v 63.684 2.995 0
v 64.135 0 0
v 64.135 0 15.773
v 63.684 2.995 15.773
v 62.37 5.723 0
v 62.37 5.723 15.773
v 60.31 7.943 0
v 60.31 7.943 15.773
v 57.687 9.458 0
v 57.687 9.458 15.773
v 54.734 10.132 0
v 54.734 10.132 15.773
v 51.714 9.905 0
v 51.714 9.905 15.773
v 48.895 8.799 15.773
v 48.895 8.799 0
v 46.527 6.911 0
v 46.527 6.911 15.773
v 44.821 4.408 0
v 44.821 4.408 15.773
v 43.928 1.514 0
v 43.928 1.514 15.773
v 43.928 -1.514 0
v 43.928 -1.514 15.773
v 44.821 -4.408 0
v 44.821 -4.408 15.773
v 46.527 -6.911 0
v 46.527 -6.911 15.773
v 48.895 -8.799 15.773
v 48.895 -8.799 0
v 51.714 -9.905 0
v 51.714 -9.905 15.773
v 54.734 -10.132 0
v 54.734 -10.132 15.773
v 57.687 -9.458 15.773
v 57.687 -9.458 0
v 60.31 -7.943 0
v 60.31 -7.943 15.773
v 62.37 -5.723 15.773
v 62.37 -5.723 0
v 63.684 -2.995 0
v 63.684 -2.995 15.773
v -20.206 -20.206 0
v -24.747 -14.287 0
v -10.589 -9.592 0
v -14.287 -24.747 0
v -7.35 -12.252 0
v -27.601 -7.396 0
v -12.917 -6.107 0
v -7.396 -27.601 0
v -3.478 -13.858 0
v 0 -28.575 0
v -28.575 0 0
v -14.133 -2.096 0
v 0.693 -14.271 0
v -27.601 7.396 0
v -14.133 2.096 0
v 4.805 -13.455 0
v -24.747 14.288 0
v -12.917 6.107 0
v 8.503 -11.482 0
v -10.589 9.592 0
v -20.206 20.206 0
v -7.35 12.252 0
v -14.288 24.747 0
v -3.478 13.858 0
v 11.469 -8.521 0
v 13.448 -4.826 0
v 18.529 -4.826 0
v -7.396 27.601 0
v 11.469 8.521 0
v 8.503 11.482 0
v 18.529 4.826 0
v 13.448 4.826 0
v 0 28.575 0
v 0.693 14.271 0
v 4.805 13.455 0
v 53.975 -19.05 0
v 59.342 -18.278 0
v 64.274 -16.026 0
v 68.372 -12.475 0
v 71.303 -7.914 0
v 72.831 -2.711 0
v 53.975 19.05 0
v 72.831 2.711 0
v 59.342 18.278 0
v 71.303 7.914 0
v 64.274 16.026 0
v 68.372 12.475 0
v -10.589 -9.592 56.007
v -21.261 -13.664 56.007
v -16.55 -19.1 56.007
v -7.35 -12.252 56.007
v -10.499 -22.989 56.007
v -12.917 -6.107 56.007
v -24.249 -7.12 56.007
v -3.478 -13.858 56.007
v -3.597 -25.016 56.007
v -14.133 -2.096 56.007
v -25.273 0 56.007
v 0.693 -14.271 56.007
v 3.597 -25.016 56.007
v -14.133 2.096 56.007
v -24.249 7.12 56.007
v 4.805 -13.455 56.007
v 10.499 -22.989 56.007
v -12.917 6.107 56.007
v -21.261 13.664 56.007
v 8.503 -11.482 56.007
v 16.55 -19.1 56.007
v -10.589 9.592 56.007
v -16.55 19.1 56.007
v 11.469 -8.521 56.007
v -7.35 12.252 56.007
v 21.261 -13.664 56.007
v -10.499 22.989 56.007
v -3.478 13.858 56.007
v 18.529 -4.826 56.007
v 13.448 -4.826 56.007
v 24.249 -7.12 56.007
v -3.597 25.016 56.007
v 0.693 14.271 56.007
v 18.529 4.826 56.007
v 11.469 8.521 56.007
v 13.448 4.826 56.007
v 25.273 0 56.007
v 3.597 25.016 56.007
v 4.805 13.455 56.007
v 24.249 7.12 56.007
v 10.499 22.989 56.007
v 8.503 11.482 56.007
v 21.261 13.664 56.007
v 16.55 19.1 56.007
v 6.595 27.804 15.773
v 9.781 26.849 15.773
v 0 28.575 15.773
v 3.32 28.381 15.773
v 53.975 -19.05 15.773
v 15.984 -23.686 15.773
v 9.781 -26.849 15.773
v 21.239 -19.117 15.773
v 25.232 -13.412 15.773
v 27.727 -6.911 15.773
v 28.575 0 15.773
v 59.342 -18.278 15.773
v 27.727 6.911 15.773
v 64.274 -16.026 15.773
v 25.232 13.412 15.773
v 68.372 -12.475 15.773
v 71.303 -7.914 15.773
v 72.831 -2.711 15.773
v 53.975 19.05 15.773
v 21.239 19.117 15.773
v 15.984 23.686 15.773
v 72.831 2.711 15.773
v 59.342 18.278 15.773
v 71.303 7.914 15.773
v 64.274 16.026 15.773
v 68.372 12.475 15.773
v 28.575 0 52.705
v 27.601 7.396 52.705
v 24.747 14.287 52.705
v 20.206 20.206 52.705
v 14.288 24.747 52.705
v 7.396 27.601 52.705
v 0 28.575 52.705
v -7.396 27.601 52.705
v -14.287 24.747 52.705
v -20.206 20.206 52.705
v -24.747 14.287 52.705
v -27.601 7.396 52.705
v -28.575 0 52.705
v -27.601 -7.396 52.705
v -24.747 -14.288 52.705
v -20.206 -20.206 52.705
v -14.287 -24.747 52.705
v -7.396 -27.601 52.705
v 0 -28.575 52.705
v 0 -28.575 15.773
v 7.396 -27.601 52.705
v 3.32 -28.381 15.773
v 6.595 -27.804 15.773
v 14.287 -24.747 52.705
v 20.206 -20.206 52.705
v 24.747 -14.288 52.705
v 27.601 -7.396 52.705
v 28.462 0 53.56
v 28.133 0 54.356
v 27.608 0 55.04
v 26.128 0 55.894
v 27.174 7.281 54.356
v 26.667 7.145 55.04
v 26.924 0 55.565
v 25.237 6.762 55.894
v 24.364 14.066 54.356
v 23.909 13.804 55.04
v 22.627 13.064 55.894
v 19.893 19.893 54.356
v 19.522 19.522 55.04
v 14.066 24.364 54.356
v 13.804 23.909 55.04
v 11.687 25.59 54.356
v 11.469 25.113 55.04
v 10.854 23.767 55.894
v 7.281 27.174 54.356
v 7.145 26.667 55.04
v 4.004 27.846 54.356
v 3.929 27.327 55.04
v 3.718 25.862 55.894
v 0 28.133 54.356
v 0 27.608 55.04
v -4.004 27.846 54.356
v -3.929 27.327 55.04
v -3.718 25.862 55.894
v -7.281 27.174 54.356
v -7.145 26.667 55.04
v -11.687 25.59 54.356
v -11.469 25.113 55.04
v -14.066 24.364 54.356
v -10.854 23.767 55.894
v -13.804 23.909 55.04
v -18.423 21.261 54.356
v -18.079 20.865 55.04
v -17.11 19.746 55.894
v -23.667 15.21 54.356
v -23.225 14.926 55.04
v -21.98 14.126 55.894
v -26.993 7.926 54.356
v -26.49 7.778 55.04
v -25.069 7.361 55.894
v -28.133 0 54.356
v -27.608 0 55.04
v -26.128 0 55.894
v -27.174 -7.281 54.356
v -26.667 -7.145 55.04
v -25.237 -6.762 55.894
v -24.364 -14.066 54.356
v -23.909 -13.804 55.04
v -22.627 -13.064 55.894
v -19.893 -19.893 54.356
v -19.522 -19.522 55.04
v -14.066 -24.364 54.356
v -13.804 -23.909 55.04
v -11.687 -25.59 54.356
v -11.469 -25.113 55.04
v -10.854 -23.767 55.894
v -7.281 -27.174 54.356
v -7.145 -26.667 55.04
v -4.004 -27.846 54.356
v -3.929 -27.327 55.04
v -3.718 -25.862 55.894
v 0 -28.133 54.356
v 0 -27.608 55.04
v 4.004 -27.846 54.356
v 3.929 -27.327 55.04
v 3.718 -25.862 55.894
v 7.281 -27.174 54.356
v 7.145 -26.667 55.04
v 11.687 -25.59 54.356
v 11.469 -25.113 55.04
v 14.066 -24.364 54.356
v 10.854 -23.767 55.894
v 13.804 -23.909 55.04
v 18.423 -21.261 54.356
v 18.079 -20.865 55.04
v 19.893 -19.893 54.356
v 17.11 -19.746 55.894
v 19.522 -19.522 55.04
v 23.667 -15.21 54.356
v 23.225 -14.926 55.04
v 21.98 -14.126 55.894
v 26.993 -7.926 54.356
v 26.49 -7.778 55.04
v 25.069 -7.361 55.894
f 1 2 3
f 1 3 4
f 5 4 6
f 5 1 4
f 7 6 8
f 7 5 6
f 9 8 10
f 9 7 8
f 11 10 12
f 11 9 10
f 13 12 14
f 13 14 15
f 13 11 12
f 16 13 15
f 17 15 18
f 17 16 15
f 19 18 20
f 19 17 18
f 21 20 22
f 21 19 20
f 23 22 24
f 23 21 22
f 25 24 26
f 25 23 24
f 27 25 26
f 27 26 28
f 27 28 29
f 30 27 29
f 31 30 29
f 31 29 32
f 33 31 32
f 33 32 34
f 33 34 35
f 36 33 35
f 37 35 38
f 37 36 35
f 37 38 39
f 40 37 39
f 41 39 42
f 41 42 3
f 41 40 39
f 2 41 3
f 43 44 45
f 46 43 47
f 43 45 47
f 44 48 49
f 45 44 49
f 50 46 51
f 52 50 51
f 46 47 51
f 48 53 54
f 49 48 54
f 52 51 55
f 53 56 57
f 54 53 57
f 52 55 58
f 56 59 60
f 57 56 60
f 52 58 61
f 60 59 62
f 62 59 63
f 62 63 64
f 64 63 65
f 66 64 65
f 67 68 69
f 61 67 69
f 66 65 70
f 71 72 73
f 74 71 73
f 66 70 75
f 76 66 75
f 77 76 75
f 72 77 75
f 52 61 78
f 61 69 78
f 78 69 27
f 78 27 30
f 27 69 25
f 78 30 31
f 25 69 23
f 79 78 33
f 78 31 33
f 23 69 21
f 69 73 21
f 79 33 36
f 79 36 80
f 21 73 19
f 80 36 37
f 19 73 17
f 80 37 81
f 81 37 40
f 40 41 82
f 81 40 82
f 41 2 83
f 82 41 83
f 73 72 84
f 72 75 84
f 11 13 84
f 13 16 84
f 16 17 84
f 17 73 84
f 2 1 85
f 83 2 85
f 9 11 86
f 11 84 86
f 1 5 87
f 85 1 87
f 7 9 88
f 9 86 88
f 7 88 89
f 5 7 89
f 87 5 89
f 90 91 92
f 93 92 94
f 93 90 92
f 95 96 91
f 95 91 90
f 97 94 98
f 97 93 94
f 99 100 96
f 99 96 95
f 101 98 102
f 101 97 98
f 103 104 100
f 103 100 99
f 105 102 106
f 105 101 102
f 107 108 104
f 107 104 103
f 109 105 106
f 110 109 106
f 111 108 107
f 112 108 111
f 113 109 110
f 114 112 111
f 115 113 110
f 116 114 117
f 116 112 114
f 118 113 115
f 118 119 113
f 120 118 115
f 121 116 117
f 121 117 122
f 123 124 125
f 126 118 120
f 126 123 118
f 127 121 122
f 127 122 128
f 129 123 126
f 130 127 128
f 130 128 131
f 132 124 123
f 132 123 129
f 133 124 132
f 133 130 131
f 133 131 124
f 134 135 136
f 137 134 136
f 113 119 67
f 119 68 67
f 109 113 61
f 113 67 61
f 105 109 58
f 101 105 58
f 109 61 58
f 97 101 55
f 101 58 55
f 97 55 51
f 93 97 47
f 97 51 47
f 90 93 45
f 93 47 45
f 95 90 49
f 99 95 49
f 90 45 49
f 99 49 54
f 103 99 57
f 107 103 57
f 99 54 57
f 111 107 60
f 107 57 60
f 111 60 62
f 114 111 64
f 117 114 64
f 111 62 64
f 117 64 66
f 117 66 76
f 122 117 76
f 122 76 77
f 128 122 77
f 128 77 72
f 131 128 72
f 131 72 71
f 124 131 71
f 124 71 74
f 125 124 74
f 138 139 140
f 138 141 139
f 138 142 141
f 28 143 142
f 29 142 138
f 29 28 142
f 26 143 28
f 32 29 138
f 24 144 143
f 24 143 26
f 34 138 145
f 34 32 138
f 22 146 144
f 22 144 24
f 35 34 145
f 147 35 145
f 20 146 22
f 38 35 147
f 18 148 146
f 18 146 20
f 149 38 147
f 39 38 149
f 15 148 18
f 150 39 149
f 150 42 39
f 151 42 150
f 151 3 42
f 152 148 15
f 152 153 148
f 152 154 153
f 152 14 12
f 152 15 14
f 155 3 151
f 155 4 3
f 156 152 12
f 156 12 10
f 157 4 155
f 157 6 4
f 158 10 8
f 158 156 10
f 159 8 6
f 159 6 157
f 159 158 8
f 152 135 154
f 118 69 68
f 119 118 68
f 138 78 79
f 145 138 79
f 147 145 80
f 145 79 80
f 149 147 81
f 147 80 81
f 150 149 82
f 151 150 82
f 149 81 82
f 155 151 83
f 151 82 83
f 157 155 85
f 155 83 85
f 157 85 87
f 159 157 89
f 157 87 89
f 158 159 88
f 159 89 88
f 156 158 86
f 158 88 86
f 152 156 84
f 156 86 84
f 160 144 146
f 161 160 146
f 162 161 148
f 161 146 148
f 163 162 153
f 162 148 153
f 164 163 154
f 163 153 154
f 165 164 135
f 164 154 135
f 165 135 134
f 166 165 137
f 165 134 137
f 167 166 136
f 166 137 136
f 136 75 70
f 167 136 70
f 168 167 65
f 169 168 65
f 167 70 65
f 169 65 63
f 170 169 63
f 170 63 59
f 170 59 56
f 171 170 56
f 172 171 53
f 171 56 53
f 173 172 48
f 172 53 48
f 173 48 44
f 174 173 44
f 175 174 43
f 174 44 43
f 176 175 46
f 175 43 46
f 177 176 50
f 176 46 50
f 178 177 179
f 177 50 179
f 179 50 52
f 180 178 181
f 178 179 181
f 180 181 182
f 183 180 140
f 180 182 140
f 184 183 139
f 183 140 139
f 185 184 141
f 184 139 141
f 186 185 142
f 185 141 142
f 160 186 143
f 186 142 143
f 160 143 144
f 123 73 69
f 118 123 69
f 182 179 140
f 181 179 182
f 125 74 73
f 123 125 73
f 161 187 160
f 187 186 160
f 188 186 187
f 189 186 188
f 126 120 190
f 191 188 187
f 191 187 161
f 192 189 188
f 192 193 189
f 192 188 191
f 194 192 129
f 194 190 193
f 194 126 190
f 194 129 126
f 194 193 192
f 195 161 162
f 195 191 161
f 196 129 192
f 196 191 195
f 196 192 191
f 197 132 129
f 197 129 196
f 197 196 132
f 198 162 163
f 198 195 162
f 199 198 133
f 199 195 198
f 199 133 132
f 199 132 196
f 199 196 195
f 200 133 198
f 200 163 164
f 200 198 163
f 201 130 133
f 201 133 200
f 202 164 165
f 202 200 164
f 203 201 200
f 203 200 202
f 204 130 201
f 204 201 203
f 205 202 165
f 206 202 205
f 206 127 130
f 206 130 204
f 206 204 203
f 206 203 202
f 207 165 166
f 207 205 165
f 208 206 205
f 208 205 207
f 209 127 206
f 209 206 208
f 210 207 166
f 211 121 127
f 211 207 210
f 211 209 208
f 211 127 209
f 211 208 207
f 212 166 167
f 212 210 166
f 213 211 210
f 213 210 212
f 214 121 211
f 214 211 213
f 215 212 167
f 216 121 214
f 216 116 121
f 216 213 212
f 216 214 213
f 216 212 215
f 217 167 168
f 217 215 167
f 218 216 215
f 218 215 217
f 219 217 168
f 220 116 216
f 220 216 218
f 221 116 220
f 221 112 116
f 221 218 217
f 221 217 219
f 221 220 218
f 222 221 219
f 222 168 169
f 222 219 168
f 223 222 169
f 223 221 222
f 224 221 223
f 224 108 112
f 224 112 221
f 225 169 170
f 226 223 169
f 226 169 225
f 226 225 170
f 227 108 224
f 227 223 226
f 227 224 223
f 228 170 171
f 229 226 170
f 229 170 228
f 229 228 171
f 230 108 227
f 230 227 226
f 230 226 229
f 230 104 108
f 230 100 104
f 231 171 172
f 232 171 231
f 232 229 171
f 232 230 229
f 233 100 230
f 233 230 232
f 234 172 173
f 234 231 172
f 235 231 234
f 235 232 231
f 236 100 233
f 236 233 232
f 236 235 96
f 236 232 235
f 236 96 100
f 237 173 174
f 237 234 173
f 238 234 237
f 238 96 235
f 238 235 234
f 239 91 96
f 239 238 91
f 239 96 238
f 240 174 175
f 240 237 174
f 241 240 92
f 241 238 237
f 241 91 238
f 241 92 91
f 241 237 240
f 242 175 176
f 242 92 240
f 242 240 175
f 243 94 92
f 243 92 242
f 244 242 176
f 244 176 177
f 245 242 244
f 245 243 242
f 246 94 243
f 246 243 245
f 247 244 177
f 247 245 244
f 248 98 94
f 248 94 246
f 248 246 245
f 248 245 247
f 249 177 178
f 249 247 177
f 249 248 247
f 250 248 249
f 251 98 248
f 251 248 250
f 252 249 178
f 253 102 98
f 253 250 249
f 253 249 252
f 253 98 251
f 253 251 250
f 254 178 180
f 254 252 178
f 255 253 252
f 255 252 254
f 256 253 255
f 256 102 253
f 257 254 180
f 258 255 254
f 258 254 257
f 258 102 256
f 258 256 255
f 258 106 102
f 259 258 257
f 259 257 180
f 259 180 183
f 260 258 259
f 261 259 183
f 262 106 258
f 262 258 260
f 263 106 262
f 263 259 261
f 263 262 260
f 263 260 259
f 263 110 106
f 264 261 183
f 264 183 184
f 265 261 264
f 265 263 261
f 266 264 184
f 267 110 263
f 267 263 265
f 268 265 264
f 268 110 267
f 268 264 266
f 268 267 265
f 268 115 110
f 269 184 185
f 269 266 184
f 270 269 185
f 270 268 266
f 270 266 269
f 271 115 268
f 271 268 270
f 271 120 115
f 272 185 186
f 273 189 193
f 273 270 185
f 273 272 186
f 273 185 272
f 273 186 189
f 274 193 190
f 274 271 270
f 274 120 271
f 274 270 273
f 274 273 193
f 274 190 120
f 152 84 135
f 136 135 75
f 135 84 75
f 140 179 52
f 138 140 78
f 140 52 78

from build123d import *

# Parameters (mm, degrees)
F0_R     = 10.16
F1_DEPTH = 15.7734
F2_R     = 28.575
F3_DEPTH = 40.2336
F4_R     = 3.302


with BuildPart() as f1:
    # F0 (on Top) → F1 (new body)
    with BuildSketch(Plane.XY):
        with BuildLine():
            Line((53.975, 19.05), (0, 28.575))
            ThreePointArc((0, 28.575), (-28.575, 0), (0, -28.575))
            Line((0, -28.575), (53.975, -19.05))
            ThreePointArc((53.975, -19.05), (73.025, 0), (53.975, 19.05))
        make_face()
        with BuildLine():
            ThreePointArc((13.447765, -4.826), (-14.2875, 0), (13.447765, 4.826))
            Line((13.447765, 4.826), (18.5293, 4.826))
            Line((18.5293, 4.826), (18.5293, -4.826))
            Line((18.5293, -4.826), (13.447765, -4.826))
        make_face(mode=Mode.SUBTRACT)
        with Locations((53.975, 0)):
            Circle(F0_R, mode=Mode.SUBTRACT)
    extrude(amount=F1_DEPTH)

    # F2 (on face) → F3 (join)
    with BuildSketch(Plane.XY.offset(15.7734)):
        Circle(F2_R)
        with BuildLine():
            ThreePointArc((13.447765, -4.826), (-14.2875, 0), (13.447765, 4.826))
            Line((13.447765, 4.826), (18.5293, 4.826))
            Line((18.5293, 4.826), (18.5293, -4.826))
            Line((18.5293, -4.826), (13.447765, -4.826))
        make_face(mode=Mode.SUBTRACT)
    extrude(amount=F3_DEPTH)

    # F4
    f4_edges = [f1.edges().sort_by_distance(p)[0] for p in [
        (-28.575, 0, 56.007),
    ]]
    fillet(f4_edges, radius=F4_R)


solid = f1.part
